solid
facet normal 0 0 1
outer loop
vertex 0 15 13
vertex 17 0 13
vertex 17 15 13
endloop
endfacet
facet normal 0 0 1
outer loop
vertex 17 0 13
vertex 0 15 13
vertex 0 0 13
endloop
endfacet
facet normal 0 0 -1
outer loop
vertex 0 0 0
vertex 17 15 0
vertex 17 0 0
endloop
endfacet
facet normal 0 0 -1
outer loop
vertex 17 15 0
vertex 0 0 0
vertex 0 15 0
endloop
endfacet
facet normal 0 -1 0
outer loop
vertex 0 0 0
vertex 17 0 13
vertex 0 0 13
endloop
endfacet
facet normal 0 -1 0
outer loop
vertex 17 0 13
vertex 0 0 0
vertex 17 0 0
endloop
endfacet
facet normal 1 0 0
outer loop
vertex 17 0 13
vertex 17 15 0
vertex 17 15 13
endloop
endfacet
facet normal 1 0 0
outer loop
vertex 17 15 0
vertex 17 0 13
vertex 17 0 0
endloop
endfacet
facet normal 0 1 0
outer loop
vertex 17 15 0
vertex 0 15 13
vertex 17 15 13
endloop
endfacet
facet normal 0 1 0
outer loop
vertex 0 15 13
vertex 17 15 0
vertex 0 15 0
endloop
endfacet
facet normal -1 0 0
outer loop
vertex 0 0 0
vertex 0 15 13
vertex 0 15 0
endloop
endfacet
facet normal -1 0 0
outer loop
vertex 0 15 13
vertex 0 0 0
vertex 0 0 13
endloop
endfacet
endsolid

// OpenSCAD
// Generated by SolidPython 1.0.1 on 2020-07-29 00:46:56


cube(size = [17, 15, 13]);
/***********************************************
*********      SolidPython code:      **********
************************************************
 
# import packages: SolidPython
from solid import *
from solid.utils import *
from itertools import chain, combinations, permutations


class Resize:

    def __init__(self, scad_file):
        self.scad_file = scad_file
        #self.scad_file = import_scad(scad_file)
        # cone/cylinder param:
        self.r1 = 0
        self.r2 = 0
        self.h = 0
        # rectangular prism param:
        self.w = 0
        self.l = 0
        # ellipse param:
        self.r = 0

    # import OpenScad code (file name corresponds to shape)


    # classify shape + parameters
    def assign(self, param1, param2, param3):
        if self.scad_file == 'cone.scad':
            self.r1 = param1
            self.r2 = param2
            self.h = param3
        elif self.scad_file == 'cylinder.scad':
            self.r1 = param1
            self.r2 = param2
            self.h = param3
        elif self.scad_file == 'rectangularPrism.scad':
            self.h = param1
            self.l = param2
            self.w = param3
        else:
            self.r = param1
            self.h = param2

    # resize parameters
    def iterate(self):
        x = range(3, 20, 2)
        i = 1
        if self.scad_file == 'cone.scad':
            tempList = list(permutations(x, 2))
            for temp in tempList:
                param1 = temp[0]
                param2 = temp[1]
                filepath = 'produced_scad_files/' + 'cone' + str(param1) + '_' + str(param2) + '_' + '.scad'
                scad_render_to_file(cylinder(h=param1, r1=param2, r2=0), filepath)

        elif self.scad_file == 'cylinder.scad':
            tempList = list(permutations(x, 3))
            for temp in tempList:
                param1 = temp[0]
                param2 = temp[1]
                filepath = 'produced_scad_files/' + 'cylinder' + str(param1) + '_' + str(param2) + '_' + '.scad'
                scad_render_to_file(cylinder(h=param1, r1=param2, r2=param2), filepath)

        elif self.scad_file == 'rectangularPrism.scad':
            tempList = list(permutations(x, 3))
            for temp in tempList:
                param1 = temp[0]
                param2 = temp[1]
                param3 = temp[2]
                filepath = 'produced_scad_files/' + 'rectangularPrism' + str(param1) + '_' + str(param2) + '_' + str(
                    param3) + '.scad'
                scad_render_to_file(cube(size=(param1, param2, param3)), filepath)

        elif self.scad_file == 'ellipse.scad':
            tempList = list(permutations(x, 4))
            for temp in tempList:
                param1 = temp[0]
                param2 = temp[1]
                param3 = temp[2]
                param4 = temp[3]
                filepath = 'produced_scad_files/' + 'ellipse' + str(param1) + '_' + str(param2) + '_' + str(param3) + '_' + str(param4) + '.scad'
                scad_render_to_file(scale([param1, param2, param3])(sphere(r=param4)), filepath)

    def render_to_scadfile(self):
        scad_render_to_file(scad, 'example.scad') 
 
************************************************/
